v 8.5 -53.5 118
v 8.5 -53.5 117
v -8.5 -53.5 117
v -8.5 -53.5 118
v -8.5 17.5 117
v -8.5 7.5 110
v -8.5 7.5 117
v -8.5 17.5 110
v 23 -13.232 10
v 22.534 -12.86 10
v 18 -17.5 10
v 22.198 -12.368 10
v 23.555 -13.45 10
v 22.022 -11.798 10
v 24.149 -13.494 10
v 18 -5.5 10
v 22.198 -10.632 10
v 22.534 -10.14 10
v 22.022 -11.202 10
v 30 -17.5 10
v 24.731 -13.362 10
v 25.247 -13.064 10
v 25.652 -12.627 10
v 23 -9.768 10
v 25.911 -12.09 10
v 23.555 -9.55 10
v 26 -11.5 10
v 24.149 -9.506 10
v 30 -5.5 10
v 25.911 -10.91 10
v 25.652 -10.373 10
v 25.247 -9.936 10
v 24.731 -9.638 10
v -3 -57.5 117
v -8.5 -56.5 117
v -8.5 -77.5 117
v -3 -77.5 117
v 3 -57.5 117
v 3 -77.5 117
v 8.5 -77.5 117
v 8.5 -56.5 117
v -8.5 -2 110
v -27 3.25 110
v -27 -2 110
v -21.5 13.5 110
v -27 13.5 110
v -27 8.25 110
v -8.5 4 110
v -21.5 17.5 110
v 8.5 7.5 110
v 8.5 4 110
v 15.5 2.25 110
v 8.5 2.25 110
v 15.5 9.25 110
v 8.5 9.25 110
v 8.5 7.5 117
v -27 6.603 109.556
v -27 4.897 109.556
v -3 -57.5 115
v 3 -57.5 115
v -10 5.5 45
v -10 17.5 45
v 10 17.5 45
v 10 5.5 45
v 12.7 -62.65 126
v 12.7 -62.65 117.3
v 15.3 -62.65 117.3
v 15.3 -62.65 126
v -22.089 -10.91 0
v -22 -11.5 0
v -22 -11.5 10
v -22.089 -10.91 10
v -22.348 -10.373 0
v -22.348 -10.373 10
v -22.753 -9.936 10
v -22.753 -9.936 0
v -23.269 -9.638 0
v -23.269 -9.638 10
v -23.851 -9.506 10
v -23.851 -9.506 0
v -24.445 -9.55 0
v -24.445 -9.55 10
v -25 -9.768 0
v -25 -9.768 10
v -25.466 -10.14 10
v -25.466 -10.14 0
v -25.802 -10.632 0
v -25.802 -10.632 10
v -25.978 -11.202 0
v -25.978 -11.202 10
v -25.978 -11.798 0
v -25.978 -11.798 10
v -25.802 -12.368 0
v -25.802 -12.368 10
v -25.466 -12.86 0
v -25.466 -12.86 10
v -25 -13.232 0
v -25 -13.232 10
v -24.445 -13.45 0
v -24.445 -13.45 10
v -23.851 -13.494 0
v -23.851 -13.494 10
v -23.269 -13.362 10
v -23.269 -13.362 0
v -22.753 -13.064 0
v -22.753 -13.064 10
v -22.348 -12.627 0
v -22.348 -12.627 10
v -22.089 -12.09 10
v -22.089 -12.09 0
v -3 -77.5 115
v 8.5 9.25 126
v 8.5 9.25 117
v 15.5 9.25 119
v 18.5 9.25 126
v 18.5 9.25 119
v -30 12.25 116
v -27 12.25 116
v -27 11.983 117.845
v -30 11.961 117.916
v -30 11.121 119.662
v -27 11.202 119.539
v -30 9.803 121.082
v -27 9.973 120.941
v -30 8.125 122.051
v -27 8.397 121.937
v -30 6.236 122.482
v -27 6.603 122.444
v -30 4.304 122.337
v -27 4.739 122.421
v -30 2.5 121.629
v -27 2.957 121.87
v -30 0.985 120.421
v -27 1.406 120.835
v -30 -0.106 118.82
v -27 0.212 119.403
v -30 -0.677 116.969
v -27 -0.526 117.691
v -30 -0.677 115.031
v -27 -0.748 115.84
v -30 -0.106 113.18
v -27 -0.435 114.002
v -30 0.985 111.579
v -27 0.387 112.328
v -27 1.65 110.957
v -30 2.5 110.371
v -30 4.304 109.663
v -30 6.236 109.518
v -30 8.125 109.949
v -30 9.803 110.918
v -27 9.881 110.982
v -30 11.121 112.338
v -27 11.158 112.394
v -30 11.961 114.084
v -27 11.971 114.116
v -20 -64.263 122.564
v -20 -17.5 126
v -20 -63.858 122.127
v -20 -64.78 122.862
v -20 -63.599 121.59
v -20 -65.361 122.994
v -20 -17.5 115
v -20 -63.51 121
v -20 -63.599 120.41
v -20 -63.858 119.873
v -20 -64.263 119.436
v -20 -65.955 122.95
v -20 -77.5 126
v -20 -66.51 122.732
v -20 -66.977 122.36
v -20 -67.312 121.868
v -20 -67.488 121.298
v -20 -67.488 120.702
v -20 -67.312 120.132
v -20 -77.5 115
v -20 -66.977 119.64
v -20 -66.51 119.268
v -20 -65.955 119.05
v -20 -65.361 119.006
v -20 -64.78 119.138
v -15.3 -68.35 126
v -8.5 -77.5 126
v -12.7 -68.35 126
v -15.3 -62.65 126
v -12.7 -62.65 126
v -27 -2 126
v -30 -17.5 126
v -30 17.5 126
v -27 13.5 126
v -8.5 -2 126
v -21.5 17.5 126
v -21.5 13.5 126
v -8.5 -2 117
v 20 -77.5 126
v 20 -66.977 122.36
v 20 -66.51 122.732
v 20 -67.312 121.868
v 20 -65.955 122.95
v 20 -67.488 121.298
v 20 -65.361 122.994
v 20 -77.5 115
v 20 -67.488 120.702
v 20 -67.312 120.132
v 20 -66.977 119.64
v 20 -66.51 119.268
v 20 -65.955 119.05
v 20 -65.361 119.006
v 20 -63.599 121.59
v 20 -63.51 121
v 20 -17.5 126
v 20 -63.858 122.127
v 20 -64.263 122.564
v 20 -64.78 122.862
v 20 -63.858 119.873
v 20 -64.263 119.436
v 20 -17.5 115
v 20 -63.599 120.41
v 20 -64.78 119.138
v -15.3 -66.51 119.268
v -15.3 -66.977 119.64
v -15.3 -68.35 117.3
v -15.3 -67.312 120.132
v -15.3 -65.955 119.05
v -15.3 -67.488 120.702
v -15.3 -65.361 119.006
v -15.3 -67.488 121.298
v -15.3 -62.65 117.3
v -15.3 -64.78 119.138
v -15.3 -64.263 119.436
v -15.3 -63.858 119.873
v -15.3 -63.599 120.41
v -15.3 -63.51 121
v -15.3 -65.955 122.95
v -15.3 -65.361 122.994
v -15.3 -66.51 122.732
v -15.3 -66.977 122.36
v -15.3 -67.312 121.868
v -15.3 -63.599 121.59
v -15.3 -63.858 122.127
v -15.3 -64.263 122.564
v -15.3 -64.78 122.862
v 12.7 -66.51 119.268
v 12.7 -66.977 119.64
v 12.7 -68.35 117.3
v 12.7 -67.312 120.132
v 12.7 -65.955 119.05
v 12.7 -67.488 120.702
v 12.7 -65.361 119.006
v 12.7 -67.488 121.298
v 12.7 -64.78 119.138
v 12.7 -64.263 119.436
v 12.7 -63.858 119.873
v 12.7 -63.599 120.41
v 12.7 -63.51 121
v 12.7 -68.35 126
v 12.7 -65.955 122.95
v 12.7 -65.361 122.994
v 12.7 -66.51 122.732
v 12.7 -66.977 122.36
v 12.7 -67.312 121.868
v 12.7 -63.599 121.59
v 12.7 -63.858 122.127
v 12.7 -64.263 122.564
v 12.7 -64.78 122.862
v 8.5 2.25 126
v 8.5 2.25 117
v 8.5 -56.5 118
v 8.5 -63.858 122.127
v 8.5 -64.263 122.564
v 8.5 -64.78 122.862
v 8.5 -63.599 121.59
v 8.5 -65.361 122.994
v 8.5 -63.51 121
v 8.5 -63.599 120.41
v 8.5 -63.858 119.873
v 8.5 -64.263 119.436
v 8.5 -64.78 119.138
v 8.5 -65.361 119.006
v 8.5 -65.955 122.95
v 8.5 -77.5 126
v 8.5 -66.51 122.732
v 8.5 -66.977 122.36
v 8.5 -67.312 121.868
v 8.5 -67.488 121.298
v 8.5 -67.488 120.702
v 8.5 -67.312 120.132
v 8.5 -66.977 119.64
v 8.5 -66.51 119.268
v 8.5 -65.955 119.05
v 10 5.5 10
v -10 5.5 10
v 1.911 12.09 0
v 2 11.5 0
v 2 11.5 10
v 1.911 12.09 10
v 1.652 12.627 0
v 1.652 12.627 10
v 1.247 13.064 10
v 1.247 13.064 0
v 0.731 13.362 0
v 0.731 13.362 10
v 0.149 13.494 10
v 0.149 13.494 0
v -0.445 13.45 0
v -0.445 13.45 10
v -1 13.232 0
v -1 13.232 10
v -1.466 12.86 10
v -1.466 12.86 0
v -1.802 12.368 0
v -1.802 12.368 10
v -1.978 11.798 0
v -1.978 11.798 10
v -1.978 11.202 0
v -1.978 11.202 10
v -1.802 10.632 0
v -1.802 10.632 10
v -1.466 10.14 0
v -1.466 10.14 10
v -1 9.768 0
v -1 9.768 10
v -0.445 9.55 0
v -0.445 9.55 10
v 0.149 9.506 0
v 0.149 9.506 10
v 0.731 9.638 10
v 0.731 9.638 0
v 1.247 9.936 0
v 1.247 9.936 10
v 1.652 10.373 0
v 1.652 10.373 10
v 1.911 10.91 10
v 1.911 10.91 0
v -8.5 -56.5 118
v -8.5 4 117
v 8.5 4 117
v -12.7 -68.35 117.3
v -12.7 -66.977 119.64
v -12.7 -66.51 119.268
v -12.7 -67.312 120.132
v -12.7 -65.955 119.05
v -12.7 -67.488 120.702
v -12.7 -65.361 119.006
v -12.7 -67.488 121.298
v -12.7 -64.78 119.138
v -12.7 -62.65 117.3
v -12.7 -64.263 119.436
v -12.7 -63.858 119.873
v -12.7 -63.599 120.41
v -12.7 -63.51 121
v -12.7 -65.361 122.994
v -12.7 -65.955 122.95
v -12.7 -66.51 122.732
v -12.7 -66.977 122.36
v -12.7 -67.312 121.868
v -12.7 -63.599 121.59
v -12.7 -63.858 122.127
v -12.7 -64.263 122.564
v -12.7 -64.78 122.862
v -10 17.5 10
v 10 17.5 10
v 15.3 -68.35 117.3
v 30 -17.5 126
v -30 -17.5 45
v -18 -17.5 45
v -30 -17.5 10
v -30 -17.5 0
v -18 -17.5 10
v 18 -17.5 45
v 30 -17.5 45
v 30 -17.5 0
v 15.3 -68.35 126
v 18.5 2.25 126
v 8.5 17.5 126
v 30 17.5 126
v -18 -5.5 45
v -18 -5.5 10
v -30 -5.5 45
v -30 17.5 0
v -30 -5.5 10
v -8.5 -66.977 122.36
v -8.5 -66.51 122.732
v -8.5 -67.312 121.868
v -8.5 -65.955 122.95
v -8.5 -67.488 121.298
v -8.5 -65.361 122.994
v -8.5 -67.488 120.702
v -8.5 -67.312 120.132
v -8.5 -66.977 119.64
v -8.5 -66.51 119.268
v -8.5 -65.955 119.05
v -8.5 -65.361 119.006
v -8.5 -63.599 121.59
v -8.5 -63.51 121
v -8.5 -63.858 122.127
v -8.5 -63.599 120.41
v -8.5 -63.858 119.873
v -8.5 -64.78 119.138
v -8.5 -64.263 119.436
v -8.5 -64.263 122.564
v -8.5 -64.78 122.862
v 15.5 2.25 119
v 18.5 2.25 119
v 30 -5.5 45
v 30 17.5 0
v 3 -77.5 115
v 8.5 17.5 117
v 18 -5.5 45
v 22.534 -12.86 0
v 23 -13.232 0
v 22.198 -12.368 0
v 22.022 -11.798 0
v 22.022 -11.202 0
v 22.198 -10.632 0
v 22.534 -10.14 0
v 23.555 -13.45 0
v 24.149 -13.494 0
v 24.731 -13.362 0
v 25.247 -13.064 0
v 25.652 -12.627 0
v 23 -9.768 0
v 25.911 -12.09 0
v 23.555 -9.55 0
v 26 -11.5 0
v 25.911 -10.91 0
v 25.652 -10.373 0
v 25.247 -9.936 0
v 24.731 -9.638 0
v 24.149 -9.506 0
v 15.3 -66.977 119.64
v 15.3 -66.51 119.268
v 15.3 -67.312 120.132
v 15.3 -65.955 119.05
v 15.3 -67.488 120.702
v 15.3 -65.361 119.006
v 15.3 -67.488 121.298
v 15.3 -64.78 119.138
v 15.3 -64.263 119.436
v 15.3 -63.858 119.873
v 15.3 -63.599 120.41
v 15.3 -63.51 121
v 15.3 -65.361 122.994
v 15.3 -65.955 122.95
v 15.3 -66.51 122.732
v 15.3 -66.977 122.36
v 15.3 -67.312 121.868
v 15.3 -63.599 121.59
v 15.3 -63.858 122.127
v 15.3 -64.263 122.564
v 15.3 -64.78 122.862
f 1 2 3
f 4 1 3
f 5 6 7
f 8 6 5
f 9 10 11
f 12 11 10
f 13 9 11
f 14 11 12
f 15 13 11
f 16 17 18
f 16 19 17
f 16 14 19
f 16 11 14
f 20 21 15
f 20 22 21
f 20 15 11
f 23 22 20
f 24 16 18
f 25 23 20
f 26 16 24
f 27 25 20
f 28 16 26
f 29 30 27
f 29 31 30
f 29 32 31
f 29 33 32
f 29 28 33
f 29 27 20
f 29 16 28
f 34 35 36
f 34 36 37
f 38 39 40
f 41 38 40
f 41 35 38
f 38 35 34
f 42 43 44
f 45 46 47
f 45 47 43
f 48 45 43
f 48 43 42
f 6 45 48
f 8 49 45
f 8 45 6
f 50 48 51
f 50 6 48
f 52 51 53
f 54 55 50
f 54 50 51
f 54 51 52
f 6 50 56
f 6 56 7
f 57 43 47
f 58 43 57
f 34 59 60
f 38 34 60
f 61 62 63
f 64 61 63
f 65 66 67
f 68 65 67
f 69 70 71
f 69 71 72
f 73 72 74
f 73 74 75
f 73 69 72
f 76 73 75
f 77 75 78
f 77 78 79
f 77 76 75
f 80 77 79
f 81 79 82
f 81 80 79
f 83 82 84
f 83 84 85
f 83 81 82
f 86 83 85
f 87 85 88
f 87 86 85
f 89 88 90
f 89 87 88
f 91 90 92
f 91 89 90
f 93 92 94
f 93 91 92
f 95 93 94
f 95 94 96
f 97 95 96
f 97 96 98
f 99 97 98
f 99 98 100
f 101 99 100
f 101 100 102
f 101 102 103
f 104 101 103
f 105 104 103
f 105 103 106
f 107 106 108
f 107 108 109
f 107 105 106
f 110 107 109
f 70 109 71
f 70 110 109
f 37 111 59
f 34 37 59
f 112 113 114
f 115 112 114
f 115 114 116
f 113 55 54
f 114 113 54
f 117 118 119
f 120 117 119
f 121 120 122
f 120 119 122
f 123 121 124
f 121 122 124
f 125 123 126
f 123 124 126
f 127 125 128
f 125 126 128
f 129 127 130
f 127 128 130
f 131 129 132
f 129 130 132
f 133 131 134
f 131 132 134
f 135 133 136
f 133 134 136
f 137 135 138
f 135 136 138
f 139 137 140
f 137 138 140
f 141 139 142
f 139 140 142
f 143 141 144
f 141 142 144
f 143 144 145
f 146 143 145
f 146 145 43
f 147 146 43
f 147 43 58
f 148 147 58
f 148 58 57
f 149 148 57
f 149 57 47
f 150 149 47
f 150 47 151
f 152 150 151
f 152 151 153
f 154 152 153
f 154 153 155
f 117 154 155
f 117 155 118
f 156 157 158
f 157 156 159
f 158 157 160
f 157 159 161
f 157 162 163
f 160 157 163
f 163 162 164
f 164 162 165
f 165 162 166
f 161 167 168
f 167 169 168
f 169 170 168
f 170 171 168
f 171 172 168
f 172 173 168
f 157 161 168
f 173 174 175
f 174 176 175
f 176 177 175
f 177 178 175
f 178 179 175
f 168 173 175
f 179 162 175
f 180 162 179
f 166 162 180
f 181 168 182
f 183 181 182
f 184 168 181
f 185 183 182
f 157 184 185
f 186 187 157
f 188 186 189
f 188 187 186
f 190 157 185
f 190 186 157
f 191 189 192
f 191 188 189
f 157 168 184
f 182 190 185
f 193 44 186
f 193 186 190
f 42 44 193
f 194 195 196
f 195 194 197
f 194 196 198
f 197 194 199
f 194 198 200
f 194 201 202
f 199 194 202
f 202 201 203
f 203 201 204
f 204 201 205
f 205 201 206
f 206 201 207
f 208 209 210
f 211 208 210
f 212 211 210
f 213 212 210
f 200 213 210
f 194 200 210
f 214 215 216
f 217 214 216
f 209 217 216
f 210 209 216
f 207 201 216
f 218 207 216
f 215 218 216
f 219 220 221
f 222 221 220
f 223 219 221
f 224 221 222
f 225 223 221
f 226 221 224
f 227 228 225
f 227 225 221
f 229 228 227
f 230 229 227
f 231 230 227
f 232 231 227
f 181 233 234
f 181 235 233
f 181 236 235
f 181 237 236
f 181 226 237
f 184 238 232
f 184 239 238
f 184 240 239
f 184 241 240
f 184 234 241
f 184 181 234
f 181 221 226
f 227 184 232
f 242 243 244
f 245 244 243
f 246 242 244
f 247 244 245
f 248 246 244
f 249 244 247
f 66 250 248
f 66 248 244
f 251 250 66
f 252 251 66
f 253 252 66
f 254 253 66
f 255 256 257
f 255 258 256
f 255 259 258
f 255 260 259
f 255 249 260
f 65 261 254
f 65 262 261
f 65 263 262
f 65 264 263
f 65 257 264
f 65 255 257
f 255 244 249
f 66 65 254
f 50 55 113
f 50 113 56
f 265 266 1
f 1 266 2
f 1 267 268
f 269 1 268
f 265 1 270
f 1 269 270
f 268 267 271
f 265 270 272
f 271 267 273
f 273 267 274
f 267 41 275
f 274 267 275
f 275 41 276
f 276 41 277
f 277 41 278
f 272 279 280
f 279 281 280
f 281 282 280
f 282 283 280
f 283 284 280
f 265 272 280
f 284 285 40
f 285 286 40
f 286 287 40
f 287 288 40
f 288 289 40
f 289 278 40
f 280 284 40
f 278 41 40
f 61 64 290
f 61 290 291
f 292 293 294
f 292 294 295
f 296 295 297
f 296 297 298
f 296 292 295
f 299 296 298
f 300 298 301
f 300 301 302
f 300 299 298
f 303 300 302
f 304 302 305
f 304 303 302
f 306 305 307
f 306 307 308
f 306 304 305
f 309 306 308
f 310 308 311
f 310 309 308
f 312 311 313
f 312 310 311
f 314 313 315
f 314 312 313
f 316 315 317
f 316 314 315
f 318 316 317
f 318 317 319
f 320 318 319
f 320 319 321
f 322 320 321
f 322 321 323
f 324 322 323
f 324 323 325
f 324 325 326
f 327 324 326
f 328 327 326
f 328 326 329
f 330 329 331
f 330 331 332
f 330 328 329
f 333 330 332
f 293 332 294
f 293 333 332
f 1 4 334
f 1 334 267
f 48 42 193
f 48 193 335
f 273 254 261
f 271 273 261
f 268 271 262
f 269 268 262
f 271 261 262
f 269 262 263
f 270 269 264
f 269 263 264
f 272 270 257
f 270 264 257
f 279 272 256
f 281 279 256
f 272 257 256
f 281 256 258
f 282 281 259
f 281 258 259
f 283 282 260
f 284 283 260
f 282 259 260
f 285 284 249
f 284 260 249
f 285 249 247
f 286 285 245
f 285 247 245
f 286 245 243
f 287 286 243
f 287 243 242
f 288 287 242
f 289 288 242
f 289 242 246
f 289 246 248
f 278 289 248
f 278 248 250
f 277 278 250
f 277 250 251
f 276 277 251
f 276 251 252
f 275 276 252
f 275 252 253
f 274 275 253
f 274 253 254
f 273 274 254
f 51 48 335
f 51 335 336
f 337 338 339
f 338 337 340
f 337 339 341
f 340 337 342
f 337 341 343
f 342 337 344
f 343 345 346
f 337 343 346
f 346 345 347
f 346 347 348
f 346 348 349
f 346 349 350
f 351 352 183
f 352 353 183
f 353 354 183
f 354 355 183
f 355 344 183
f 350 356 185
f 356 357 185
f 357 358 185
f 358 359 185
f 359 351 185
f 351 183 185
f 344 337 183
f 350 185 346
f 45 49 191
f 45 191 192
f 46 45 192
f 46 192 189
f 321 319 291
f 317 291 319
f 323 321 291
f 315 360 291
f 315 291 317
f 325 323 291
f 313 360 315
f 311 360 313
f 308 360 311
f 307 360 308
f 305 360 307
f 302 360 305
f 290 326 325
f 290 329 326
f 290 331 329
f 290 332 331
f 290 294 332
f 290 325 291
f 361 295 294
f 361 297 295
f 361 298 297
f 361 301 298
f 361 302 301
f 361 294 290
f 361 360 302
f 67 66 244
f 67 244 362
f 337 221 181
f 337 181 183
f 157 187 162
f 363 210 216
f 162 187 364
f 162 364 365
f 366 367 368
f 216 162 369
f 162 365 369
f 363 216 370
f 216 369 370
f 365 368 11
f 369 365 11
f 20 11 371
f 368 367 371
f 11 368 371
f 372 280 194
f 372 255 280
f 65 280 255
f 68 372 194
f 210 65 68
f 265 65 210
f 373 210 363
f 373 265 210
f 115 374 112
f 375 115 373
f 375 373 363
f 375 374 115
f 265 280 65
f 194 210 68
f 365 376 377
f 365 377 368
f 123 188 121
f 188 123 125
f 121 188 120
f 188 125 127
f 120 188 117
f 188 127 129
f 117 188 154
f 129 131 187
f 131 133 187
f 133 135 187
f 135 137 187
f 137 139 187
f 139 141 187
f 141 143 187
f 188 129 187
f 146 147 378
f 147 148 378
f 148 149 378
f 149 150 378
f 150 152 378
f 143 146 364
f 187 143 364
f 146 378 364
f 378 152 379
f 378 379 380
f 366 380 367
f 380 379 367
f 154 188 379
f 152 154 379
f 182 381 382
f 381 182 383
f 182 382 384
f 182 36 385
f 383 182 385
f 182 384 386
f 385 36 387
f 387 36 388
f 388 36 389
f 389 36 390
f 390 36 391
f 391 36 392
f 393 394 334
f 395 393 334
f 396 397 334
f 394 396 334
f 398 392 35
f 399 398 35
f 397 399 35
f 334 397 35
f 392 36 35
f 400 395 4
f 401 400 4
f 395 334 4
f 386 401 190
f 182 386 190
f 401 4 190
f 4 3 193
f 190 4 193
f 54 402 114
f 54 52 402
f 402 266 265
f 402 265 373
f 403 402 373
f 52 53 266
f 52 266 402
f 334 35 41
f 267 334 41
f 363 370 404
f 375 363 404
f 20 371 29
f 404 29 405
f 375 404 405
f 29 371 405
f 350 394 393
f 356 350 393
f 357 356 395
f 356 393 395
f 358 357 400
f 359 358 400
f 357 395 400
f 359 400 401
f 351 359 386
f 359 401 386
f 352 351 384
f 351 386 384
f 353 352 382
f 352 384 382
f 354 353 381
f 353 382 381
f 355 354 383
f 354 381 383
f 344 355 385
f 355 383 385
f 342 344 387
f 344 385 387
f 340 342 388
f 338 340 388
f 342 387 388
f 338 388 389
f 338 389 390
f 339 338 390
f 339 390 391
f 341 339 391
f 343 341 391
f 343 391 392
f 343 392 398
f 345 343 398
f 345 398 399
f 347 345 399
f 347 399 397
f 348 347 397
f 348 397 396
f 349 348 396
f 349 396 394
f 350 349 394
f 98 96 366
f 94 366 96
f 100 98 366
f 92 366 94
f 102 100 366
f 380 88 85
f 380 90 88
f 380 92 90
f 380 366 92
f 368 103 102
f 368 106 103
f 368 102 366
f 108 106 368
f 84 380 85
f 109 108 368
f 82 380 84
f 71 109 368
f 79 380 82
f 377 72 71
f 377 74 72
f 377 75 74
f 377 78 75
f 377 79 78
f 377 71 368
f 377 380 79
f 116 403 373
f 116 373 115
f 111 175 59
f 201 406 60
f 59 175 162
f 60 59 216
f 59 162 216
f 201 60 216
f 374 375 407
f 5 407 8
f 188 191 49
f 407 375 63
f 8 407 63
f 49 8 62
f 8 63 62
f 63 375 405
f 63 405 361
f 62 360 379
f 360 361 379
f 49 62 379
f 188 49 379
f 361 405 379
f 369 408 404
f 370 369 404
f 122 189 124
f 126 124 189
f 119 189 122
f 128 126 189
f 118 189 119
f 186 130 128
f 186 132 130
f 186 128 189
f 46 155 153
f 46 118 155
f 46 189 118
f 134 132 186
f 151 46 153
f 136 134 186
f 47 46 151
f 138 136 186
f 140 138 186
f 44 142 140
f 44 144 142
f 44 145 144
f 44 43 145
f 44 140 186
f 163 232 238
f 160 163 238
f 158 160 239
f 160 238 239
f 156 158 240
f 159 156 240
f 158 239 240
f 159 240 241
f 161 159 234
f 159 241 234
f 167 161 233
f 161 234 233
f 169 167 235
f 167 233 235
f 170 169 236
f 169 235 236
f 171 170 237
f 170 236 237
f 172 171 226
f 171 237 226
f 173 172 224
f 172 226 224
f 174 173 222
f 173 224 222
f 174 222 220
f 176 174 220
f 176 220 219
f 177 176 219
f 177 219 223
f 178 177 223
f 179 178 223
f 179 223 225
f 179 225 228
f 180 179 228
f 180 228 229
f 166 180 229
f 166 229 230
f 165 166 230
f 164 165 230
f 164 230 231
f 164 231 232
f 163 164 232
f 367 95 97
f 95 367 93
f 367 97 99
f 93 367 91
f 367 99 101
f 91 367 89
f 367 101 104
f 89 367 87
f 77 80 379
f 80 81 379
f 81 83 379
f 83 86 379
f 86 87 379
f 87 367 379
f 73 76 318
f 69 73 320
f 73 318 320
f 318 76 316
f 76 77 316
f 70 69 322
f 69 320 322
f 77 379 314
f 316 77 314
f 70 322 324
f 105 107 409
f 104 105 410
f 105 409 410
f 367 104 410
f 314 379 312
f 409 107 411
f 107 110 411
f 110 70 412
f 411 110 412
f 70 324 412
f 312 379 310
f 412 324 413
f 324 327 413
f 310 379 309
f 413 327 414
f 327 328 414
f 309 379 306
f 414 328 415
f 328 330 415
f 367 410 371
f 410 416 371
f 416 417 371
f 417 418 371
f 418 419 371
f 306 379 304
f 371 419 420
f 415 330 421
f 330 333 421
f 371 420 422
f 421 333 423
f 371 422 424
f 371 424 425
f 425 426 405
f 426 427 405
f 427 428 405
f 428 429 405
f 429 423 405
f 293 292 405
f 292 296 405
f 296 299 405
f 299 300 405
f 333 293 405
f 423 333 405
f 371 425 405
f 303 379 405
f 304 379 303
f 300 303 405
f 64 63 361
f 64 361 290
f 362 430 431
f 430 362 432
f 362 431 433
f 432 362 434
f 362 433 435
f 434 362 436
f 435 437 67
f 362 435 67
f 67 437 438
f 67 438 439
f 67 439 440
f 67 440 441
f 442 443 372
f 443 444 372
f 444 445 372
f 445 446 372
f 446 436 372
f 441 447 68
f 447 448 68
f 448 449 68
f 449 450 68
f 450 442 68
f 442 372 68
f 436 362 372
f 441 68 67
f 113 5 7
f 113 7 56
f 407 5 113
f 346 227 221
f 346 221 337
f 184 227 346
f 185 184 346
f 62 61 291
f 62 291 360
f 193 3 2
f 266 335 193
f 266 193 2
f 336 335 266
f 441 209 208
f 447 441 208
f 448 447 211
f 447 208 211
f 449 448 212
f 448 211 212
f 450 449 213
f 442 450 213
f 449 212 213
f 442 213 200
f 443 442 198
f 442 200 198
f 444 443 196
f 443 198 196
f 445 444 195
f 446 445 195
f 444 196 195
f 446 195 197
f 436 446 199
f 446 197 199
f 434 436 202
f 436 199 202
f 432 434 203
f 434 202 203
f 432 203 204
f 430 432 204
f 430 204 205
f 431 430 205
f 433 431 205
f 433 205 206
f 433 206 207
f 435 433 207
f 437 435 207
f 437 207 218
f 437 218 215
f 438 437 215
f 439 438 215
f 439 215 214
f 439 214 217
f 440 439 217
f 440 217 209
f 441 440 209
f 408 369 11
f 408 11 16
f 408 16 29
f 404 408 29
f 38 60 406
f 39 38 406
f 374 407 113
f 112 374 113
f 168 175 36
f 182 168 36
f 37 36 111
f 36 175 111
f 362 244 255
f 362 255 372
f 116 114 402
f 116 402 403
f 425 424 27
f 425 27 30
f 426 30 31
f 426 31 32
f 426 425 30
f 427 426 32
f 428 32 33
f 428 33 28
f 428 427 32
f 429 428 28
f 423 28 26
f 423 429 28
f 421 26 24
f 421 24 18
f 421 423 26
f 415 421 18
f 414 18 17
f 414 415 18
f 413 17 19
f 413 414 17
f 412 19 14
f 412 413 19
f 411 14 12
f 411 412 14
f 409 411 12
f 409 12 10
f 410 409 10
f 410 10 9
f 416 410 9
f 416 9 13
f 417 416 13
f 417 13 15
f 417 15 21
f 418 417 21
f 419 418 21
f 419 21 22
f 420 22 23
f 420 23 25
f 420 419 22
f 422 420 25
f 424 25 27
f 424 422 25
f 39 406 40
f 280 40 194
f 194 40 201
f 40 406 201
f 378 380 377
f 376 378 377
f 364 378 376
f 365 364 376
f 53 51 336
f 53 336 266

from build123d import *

# Parameters (mm, degrees)
F0_W      = 60
F0_H      = 35
F0_R      = 2
F1_DEPTH  = 10
F3_DEPTH  = 35
F4_W      = 60
F4_H      = 35
F5_DEPTH  = 70
F7_DEPTH  = 2
F9_DEPTH  = 1
F11_DEPTH = 8
F12_R     = 2
F13_DEPTH = 45
F14_W     = 2.6
F14_H     = 5.7
F15_DEPTH = 8.7
F18_DEPTH = 16
F19_R     = 6.5
F20_DEPTH = 5
F22_W     = 3
F22_H     = 7
F23_DEPTH = 12
F24_DEPTH = 5


with BuildPart() as f1:
    # F0 (on Top) → F1 (new body)
    with BuildSketch(Plane.XY):
        Rectangle(F0_W, F0_H)
        with Locations((-24, -11.5)):
            Circle(F0_R, mode=Mode.SUBTRACT)
        with Locations((24, -11.5)):
            Circle(F0_R, mode=Mode.SUBTRACT)
        with Locations((0, 11.5)):
            Circle(F0_R, mode=Mode.SUBTRACT)
    extrude(amount=F1_DEPTH)

    # F2 (on face) → F3 (join)
    with BuildSketch(Plane.XY.offset(10)):
        Polygon((-10, 17.5), (-30, 17.5), (-30, -5.5), (-18, -5.5), (-18, -17.5), (18, -17.5), (18, -5.5), (30, -5.5), (30, 17.5), (10, 17.5), (10, 5.5), (-10, 5.5), align=None)
    extrude(amount=F3_DEPTH)

    # F4 (on face) → F5 (join)
    with BuildSketch(Plane.XY.offset(45)):
        Rectangle(F4_W, F4_H)
    extrude(amount=F5_DEPTH)

    # F6 (on face) → F7 (join)
    with BuildSketch(Plane.XY.offset(115)):
        Polygon((30, 17.5), (-30, 17.5), (-30, -17.5), (-20, -17.5), (-20, -77.5), (-3, -77.5), (-3, -57.5), (3, -57.5), (3, -77.5), (20, -77.5), (20, -17.5), (30, -17.5), align=None)
    extrude(amount=F7_DEPTH)

    # F8 (on face) → F9 (join)
    with BuildSketch(Plane.XY.offset(117)):
        Polygon((-30, 17.5), (-30, -17.5), (-20, -17.5), (-20, -77.5), (-8.5, -77.5), (-8.5, -56.5), (8.5, -56.5), (8.5, -77.5), (20, -77.5), (20, -17.5), (30, -17.5), (30, 17.5), (8.5, 17.5), (8.5, -53.5), (-8.5, -53.5), (-8.5, 17.5), align=None)
    extrude(amount=F9_DEPTH)

    # F10 (on face) → F11 (join)
    with BuildSketch(Plane.XY.offset(118)):
        Polygon((-20, -77.5), (-8.5, -77.5), (-8.5, 17.5), (-30, 17.5), (-30, -17.5), (-20, -17.5), align=None)
        Polygon((8.5, -77.5), (20, -77.5), (20, -17.5), (30, -17.5), (30, 17.5), (8.5, 17.5), align=None)
    extrude(amount=F11_DEPTH)

    # F12 (on face) → F13 (cut)
    with BuildSketch(Plane.YZ.offset(20)):
        with Locations((-65.5104211917, 121)):
            Circle(F12_R)
    extrude(amount=-F13_DEPTH, mode=Mode.SUBTRACT)

    # F14 (on face) → F15 (cut)
    with BuildSketch(Plane.XY.offset(126)):
        with Locations((14, -65.5)):
            Rectangle(F14_W, F14_H)
        with Locations((-14, -65.5)):
            Rectangle(F14_W, F14_H)
    extrude(amount=-F15_DEPTH, mode=Mode.SUBTRACT)

    # F17 (on offset) → F18 (cut)
    with BuildSketch(Plane.XY.offset(110)):
        Polygon((-21.5, 13.5), (-27, 13.5), (-27, -2), (-8.5, -2), (-8.5, 4), (8.5, 4), (8.5, 2.25), (15.5, 2.25), (15.5, 9.25), (8.5, 9.25), (8.5, 7.5), (-8.5, 7.5), (-8.5, 13.5), (-8.5, 17.5), (-21.5, 17.5), align=None)
    extrude(amount=F18_DEPTH, mode=Mode.SUBTRACT)

    # F19 (on face) → F20 (cut)
    with BuildSketch(Plane.YZ.offset(-27)):
        with Locations((5.75, 116)):
            Circle(F19_R)
    extrude(amount=-F20_DEPTH, mode=Mode.SUBTRACT)

    # F22 (on offset) → F23 (cut)
    with BuildSketch(Plane.XY.offset(114)):
        with Locations((17, 5.75)):
            Rectangle(F22_W, F22_H)
    extrude(amount=F23_DEPTH, mode=Mode.SUBTRACT)

    # F22 (on offset) → F24 (join)
    with BuildSketch(Plane.XY.offset(114)):
        with Locations((17, 5.75)):
            Rectangle(F22_W, F22_H)
    extrude(amount=F24_DEPTH)


solid = f1.part
